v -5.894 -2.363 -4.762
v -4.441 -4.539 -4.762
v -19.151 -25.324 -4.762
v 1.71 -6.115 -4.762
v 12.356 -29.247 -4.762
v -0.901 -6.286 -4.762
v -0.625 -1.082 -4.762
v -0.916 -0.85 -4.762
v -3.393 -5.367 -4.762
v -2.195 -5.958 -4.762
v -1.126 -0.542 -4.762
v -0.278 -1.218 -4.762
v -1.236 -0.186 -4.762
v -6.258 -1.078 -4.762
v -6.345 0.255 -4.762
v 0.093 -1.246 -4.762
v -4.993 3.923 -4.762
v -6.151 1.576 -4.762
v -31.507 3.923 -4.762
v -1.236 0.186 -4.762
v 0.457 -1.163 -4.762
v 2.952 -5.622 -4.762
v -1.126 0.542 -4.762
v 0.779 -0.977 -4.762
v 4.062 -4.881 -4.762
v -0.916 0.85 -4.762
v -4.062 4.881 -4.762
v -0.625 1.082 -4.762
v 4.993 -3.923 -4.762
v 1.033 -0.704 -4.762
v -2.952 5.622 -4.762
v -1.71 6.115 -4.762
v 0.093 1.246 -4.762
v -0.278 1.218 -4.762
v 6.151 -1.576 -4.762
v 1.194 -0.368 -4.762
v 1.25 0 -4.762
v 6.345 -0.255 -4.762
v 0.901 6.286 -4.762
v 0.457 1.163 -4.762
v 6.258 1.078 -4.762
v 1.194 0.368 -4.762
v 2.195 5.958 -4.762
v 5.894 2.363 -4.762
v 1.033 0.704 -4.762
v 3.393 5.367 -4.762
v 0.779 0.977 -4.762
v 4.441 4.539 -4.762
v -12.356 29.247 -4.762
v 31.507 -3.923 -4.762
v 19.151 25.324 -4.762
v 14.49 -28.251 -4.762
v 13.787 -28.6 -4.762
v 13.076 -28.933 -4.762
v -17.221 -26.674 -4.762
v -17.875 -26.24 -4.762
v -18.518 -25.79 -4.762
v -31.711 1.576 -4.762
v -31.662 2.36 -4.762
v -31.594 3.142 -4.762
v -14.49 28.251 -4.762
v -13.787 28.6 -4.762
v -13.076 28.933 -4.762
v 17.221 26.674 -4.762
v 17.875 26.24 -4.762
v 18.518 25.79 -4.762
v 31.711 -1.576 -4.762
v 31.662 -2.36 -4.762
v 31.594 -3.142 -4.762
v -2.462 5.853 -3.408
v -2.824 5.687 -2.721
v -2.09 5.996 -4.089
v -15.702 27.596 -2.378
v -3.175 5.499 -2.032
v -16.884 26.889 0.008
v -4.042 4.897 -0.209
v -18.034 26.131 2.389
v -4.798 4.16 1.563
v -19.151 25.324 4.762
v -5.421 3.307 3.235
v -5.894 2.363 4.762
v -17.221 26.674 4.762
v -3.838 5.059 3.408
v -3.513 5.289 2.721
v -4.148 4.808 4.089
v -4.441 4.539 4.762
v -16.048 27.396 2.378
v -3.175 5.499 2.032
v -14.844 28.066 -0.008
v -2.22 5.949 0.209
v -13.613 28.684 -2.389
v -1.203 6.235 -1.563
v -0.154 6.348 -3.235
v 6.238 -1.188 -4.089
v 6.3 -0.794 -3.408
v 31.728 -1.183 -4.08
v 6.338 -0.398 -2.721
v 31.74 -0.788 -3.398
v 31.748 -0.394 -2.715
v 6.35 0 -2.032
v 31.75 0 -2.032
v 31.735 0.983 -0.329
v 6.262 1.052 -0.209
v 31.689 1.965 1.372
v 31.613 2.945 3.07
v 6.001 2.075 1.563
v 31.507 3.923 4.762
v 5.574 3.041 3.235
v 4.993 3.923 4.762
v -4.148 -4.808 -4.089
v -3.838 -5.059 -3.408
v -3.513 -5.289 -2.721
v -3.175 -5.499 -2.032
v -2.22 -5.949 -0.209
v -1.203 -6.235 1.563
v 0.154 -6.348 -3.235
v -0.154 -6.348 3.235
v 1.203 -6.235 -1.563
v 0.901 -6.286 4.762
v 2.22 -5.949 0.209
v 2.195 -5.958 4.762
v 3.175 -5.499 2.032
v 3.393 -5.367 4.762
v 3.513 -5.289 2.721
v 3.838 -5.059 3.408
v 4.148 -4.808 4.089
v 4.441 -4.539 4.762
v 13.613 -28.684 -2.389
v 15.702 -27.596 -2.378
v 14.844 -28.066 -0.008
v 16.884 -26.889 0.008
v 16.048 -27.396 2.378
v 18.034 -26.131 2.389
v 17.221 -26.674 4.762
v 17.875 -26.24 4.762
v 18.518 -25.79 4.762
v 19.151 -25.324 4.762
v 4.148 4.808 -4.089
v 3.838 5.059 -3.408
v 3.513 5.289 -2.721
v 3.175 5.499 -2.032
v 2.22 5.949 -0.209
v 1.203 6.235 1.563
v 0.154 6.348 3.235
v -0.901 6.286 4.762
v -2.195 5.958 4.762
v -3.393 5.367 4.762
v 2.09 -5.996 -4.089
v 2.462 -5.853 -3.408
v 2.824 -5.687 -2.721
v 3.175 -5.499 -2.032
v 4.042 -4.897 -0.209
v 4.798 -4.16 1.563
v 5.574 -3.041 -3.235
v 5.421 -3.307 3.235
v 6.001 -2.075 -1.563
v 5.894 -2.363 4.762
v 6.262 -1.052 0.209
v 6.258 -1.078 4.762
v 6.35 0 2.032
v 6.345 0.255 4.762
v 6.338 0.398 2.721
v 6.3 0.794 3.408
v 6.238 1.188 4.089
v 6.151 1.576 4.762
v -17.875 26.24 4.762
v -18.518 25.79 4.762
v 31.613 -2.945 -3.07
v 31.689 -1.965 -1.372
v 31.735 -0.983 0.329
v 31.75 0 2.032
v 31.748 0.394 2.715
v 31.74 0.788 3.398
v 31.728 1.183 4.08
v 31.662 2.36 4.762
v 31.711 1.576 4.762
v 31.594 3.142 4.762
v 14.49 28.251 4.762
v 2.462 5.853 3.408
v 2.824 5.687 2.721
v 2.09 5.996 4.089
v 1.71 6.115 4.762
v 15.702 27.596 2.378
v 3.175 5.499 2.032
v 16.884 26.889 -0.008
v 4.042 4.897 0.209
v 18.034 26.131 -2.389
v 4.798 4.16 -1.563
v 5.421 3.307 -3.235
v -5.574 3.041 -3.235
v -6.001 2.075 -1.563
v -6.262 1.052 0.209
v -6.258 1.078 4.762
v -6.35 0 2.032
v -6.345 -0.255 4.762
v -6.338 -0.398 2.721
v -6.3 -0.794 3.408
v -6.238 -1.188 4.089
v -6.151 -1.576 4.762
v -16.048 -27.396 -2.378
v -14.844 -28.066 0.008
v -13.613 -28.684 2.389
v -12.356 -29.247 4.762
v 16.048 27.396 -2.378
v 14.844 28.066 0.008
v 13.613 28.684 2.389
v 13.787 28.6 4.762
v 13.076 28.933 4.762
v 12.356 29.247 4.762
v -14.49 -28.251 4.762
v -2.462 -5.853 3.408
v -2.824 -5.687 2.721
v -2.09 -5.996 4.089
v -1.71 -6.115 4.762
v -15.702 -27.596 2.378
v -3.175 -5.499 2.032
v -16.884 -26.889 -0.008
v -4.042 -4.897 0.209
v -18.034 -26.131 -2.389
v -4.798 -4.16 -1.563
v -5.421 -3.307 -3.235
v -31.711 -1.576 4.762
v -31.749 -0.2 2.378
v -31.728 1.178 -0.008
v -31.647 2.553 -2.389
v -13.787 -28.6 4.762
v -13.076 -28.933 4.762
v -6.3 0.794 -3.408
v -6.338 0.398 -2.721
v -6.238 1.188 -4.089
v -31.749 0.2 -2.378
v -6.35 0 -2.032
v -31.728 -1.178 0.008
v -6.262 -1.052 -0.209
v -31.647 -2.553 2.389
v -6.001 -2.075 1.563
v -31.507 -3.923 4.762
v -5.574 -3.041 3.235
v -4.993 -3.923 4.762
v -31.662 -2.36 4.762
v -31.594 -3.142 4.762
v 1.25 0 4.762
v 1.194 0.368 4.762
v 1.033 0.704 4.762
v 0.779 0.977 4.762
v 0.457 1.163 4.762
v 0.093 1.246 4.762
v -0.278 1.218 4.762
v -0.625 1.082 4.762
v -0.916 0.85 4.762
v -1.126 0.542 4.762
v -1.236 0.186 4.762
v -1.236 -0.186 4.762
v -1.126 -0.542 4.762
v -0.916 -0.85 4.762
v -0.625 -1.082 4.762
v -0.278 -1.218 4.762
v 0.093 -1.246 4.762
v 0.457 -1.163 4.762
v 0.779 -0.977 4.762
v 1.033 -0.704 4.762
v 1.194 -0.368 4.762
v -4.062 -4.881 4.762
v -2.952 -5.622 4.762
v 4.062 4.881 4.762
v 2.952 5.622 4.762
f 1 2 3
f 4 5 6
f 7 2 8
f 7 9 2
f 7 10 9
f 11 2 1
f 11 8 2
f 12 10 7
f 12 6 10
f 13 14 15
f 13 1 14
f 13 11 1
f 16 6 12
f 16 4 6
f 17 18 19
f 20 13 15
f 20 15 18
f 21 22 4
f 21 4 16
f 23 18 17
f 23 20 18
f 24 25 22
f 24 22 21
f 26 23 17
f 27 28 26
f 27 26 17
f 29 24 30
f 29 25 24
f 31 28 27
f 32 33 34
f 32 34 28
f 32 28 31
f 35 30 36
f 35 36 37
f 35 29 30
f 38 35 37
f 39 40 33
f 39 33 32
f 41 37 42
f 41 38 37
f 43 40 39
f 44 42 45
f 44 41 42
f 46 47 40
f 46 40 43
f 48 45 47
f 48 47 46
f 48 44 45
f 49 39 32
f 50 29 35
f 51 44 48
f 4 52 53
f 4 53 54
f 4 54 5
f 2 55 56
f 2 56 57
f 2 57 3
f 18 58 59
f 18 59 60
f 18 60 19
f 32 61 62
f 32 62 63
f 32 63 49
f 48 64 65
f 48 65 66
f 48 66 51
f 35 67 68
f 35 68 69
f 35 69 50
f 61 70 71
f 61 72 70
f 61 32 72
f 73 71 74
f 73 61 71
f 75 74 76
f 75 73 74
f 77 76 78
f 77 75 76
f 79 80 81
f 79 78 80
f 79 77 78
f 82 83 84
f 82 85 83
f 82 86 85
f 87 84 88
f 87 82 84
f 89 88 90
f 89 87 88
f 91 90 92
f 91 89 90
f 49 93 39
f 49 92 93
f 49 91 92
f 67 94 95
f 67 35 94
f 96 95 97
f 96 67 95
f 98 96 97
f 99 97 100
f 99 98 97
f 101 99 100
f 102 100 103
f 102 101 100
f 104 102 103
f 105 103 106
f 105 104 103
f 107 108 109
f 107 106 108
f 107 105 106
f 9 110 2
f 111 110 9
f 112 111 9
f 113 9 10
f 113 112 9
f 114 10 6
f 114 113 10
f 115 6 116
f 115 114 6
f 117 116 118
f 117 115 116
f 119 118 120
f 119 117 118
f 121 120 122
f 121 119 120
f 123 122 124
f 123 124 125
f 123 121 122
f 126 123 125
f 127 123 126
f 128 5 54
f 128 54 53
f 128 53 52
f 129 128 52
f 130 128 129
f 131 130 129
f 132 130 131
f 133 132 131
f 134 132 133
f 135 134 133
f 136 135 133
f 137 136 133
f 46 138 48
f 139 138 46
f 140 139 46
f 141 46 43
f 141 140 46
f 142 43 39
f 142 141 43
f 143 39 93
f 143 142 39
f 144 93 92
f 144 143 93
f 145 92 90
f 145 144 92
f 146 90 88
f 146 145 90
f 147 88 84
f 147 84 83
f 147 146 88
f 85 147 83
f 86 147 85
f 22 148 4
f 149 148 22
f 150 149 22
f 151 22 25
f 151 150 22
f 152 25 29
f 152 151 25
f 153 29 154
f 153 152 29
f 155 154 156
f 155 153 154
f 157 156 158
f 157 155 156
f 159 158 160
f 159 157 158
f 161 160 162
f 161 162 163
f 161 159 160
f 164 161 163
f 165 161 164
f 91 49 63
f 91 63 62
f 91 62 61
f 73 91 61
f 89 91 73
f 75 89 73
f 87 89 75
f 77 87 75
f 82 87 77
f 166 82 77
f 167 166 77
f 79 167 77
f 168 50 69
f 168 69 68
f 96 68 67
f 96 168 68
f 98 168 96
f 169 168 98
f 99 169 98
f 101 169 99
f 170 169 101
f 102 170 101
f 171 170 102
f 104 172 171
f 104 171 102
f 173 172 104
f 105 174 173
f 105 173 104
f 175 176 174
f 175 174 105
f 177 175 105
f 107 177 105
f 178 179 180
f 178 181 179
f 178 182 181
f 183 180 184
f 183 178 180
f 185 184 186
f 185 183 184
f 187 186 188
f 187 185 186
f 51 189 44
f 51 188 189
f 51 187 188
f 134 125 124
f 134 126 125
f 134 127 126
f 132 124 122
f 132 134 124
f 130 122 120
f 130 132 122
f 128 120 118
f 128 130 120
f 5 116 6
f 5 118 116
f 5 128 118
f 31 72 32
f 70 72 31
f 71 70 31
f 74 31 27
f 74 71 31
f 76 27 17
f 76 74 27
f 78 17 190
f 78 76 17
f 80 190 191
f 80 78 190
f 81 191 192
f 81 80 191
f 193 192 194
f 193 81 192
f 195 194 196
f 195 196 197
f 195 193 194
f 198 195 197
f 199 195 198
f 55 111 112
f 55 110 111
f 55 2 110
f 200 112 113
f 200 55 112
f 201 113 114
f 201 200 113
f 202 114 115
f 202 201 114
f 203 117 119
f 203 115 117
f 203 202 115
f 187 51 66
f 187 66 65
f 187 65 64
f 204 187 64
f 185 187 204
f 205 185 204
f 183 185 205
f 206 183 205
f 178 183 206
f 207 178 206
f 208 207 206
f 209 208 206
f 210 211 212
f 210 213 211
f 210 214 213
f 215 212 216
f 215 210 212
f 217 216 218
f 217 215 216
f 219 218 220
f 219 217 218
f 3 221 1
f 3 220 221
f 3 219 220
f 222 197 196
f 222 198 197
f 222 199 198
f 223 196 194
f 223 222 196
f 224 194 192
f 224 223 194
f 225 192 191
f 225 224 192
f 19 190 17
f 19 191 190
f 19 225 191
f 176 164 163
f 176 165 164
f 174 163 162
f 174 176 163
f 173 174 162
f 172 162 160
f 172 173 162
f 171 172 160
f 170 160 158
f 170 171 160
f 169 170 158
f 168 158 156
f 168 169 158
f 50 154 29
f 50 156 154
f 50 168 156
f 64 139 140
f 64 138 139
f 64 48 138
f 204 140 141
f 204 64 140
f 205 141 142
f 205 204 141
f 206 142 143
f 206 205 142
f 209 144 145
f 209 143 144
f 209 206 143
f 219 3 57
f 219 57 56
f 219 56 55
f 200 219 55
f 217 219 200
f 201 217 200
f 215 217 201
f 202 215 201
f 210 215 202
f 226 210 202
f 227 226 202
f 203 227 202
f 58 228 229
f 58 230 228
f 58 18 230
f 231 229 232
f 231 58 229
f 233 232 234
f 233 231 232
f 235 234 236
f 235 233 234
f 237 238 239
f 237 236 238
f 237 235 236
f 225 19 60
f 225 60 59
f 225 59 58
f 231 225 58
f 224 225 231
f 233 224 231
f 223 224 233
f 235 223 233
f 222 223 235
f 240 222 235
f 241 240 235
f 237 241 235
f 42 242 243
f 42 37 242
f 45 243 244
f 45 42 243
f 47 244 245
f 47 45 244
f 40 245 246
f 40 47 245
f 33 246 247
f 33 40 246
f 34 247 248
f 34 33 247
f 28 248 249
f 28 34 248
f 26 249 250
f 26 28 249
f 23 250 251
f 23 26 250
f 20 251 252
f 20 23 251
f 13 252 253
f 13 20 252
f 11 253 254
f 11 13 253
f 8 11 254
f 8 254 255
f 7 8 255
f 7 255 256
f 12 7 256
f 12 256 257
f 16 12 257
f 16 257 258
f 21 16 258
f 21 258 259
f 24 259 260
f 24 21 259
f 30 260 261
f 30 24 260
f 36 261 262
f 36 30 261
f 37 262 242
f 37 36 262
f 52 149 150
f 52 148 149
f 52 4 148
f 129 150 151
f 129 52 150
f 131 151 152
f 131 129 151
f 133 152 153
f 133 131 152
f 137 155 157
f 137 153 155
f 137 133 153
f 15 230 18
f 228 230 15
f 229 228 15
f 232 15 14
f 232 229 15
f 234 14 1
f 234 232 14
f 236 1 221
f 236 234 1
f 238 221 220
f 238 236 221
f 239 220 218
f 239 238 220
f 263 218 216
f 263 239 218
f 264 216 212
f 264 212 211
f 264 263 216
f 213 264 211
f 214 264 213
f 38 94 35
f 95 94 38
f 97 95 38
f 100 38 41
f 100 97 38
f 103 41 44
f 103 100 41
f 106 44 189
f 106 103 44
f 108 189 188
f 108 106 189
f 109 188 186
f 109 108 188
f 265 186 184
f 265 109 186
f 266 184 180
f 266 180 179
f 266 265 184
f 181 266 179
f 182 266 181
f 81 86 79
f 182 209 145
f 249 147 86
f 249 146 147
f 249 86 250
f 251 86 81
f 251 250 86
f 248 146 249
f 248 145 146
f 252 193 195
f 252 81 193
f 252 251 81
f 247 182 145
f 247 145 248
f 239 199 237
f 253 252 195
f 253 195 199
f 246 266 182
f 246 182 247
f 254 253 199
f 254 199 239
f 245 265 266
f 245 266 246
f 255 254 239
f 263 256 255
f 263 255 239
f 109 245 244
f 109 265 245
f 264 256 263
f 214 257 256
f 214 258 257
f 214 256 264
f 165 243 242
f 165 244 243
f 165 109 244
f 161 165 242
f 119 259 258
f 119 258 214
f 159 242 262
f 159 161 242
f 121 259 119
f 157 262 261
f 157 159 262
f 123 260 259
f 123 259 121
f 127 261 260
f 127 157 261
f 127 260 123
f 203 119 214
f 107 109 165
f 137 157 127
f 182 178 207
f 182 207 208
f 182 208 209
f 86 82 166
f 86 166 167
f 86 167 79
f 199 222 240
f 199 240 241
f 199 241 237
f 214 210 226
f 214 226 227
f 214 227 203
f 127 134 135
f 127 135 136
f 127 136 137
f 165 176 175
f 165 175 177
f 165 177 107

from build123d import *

# Parameters (mm, degrees)
F0_R            = 6.35
F0_R_2          = 1.24968
F1_DEPTH        = 4.7625
F4_COPIES_COUNT = 6
F5_R            = 254
F5_R_2          = 31.75
F6_DEPTH        = 9.526


# Not quite as in the source:
# - a pattern or mirror of a feature is missing from the dataset's text; its kind, count and spacing are read off the source's solid


with BuildPart() as f1:
    # F0 (on Top) → F1 (new body, symmetric)
    with BuildSketch(Plane.XY):
        Circle(F0_R)
        Circle(F0_R_2, mode=Mode.SUBTRACT)
    extrude(amount=F1_DEPTH, both=True)

    # F3 (on offset) → F4 (join, up to the next surface of F1)
    with BuildSketch(Plane.YZ.offset(152.4)):
        Polygon((1.57645491, 4.7625), (-3.922806404, -4.7625), (-1.57645491, -4.7625), (3.922806404, 4.7625), align=None)
    f4 = extrude(until=Until.NEXT, dir=(-1, 0, 0))

    # F4_copies: F4 ×6 about axis
    f4_copies_axis = Axis((0, 0, 0), (0, 0, 1))
    for i in range(1, F4_COPIES_COUNT):
        add(f4.rotate(f4_copies_axis, i * 360 / F4_COPIES_COUNT))

    # F5 (on face) → F6 (cut, through all)
    with BuildSketch(Plane.XY.offset(4.7625)):
        Circle(F5_R)
        Circle(F5_R_2, mode=Mode.SUBTRACT)
    extrude(amount=-F6_DEPTH, mode=Mode.SUBTRACT)


solid = f1.part
